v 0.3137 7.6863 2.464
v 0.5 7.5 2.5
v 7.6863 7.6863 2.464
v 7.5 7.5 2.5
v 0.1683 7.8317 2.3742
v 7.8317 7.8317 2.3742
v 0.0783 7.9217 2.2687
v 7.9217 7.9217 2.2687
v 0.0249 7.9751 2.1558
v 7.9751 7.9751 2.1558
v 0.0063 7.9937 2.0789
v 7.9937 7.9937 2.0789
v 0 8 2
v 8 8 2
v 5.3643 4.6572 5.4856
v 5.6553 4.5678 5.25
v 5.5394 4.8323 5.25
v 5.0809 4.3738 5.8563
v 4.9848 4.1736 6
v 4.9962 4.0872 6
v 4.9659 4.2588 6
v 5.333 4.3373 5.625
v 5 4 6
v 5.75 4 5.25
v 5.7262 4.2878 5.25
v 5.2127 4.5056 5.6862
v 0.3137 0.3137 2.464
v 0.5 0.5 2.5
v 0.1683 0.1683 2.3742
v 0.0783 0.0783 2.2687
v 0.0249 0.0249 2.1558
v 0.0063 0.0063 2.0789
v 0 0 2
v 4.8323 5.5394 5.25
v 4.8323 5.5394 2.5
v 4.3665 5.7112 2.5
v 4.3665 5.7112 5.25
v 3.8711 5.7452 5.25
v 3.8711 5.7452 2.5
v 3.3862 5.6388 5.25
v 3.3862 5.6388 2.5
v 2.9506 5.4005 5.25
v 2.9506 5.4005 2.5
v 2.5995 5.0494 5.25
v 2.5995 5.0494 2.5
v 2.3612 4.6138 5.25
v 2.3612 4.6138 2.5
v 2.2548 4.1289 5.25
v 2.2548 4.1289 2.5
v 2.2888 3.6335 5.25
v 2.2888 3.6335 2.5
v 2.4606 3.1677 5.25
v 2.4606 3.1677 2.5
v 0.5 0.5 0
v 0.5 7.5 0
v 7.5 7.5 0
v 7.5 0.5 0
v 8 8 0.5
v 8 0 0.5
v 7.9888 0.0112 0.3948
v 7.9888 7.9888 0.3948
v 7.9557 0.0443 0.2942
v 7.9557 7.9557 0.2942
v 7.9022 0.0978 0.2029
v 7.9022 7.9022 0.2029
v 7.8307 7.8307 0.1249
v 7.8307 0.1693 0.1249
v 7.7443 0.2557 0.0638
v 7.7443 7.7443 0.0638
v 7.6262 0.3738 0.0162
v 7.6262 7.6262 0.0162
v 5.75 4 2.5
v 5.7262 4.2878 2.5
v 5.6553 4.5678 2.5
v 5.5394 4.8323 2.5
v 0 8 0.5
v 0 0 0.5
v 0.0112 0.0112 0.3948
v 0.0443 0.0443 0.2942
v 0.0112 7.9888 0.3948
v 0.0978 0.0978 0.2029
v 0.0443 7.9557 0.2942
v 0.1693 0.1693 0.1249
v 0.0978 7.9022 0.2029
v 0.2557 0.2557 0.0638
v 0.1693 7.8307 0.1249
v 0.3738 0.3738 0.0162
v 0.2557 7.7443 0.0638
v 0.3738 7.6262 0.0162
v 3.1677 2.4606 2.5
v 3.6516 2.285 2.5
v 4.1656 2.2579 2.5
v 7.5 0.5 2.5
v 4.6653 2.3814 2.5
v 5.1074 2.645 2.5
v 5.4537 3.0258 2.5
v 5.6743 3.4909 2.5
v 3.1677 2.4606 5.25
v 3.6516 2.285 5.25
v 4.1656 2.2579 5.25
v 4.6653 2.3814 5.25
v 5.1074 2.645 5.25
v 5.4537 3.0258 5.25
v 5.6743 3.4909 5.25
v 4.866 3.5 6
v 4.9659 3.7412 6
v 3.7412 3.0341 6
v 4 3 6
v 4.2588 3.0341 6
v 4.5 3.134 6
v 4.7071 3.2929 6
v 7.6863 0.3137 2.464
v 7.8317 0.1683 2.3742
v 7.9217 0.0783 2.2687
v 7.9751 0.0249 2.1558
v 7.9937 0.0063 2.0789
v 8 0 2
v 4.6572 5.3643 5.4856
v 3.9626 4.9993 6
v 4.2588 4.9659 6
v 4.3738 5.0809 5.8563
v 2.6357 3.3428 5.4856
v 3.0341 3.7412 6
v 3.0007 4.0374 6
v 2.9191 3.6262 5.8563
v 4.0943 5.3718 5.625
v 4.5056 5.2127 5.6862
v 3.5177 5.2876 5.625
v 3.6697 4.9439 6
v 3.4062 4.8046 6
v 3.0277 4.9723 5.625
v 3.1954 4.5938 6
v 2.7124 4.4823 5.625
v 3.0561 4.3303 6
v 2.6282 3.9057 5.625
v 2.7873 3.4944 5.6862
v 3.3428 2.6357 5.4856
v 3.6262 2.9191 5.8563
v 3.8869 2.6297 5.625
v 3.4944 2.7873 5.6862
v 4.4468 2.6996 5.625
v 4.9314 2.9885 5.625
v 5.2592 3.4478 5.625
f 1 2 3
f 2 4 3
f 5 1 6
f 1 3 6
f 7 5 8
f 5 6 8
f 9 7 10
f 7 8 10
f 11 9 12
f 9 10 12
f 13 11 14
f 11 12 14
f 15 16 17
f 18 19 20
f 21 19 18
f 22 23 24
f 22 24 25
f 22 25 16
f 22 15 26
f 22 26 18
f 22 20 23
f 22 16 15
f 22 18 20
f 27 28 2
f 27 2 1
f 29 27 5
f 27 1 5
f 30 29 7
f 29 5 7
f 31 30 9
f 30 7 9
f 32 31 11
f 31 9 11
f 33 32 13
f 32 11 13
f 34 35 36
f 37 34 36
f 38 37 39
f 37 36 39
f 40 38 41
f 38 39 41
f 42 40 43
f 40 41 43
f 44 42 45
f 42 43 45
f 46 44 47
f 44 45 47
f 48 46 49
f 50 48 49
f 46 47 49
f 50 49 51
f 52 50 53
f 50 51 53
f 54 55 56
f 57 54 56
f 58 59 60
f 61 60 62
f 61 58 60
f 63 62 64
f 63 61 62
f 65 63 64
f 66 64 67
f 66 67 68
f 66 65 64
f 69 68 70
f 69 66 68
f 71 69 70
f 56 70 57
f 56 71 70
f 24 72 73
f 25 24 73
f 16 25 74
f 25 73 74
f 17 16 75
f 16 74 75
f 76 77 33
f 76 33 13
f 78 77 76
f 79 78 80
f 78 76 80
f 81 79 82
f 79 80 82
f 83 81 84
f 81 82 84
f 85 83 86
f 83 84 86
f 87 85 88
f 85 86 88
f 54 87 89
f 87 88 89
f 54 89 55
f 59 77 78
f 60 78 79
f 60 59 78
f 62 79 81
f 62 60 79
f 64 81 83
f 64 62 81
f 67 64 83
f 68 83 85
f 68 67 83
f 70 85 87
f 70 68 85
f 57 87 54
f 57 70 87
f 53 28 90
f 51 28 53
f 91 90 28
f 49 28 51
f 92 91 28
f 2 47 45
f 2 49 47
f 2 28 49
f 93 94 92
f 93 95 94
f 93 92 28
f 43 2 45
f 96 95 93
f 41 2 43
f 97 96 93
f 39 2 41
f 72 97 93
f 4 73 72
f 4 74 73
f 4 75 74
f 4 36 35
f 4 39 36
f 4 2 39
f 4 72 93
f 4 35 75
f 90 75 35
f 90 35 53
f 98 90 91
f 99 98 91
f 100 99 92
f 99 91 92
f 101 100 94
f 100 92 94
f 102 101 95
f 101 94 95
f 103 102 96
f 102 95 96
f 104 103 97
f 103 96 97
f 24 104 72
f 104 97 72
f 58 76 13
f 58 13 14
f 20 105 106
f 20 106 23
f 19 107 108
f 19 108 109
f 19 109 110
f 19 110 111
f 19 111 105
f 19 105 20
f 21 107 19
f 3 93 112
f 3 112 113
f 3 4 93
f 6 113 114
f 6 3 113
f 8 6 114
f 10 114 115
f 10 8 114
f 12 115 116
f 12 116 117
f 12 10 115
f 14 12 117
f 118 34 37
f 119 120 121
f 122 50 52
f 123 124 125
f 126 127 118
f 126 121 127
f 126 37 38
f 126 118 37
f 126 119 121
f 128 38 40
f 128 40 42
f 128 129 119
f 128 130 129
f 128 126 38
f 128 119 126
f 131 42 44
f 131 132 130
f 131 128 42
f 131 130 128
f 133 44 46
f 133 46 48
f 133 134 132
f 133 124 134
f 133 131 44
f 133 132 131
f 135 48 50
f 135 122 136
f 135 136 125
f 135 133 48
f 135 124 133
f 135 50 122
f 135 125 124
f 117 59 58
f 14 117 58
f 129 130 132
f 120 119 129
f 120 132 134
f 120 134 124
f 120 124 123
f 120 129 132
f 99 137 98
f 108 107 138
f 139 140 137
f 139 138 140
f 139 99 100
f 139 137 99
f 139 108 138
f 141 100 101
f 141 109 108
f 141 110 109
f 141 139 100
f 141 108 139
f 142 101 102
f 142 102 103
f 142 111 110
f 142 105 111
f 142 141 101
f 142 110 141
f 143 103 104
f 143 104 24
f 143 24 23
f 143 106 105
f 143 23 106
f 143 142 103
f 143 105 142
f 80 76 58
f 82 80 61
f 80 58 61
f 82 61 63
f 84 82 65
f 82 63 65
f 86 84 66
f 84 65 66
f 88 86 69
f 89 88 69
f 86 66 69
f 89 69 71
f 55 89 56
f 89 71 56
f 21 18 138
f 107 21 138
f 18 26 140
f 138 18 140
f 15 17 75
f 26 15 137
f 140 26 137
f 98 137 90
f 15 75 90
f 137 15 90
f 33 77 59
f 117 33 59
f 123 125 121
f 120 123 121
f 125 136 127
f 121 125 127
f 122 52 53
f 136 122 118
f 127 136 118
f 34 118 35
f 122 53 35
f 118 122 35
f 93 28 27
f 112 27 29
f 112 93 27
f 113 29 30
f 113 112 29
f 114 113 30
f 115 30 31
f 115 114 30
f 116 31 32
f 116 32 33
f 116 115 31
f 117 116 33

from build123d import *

# Parameters (mm, degrees)
F0_W     = 8
F0_H     = 8
F1_DEPTH = 2.5
F3_DEPTH = 3.5
F4_SIZE  = 0.75
F5_R     = 0.5


with BuildPart() as f1:
    # F0 (on Top) → F1 (new body)
    with BuildSketch(Plane.XY):
        with Locations((4, 4)):
            Rectangle(F0_W, F0_H)
    extrude(amount=F1_DEPTH)

    # F2 (on face) → F3 (join)
    with BuildSketch(Plane.XY.offset(2.5)):
        with BuildLine():
            Line((2.460592, 3.167699), (4.832301, 5.539408))
            ThreePointArc((4.832301, 5.539408), (2.762563, 5.237437), (2.460592, 3.167699))
        make_face()
        with BuildLine():
            ThreePointArc((3.167699, 2.460592), (4.896095, 2.496832), (5.75, 4))
            ThreePointArc((5.75, 4), (5.696535, 4.429265), (5.539408, 4.832301))
            Line((5.539408, 4.832301), (3.167699, 2.460592))
        make_face()
    extrude(amount=F3_DEPTH)

    # F4
    f4_edges = [f1.edges().sort_by_distance(p)[0] for p in [
        (5.237437, 2.762563, 6),
        (2.762563, 5.237437, 6),
    ]]
    chamfer(f4_edges, length=F4_SIZE)

    # F5
    f5_edges = [f1.edges().sort_by_distance(p)[0] for p in [
        (0, 4, 2.5),
        (4, 0, 2.5),
        (8, 4, 2.5),
        (4, 8, 2.5),
        (4, 8, 0),
        (8, 4, 0),
        (4, 0, 0),
        (0, 4, 0),
    ]]
    fillet(f5_edges, radius=F5_R)


solid = f1.part
